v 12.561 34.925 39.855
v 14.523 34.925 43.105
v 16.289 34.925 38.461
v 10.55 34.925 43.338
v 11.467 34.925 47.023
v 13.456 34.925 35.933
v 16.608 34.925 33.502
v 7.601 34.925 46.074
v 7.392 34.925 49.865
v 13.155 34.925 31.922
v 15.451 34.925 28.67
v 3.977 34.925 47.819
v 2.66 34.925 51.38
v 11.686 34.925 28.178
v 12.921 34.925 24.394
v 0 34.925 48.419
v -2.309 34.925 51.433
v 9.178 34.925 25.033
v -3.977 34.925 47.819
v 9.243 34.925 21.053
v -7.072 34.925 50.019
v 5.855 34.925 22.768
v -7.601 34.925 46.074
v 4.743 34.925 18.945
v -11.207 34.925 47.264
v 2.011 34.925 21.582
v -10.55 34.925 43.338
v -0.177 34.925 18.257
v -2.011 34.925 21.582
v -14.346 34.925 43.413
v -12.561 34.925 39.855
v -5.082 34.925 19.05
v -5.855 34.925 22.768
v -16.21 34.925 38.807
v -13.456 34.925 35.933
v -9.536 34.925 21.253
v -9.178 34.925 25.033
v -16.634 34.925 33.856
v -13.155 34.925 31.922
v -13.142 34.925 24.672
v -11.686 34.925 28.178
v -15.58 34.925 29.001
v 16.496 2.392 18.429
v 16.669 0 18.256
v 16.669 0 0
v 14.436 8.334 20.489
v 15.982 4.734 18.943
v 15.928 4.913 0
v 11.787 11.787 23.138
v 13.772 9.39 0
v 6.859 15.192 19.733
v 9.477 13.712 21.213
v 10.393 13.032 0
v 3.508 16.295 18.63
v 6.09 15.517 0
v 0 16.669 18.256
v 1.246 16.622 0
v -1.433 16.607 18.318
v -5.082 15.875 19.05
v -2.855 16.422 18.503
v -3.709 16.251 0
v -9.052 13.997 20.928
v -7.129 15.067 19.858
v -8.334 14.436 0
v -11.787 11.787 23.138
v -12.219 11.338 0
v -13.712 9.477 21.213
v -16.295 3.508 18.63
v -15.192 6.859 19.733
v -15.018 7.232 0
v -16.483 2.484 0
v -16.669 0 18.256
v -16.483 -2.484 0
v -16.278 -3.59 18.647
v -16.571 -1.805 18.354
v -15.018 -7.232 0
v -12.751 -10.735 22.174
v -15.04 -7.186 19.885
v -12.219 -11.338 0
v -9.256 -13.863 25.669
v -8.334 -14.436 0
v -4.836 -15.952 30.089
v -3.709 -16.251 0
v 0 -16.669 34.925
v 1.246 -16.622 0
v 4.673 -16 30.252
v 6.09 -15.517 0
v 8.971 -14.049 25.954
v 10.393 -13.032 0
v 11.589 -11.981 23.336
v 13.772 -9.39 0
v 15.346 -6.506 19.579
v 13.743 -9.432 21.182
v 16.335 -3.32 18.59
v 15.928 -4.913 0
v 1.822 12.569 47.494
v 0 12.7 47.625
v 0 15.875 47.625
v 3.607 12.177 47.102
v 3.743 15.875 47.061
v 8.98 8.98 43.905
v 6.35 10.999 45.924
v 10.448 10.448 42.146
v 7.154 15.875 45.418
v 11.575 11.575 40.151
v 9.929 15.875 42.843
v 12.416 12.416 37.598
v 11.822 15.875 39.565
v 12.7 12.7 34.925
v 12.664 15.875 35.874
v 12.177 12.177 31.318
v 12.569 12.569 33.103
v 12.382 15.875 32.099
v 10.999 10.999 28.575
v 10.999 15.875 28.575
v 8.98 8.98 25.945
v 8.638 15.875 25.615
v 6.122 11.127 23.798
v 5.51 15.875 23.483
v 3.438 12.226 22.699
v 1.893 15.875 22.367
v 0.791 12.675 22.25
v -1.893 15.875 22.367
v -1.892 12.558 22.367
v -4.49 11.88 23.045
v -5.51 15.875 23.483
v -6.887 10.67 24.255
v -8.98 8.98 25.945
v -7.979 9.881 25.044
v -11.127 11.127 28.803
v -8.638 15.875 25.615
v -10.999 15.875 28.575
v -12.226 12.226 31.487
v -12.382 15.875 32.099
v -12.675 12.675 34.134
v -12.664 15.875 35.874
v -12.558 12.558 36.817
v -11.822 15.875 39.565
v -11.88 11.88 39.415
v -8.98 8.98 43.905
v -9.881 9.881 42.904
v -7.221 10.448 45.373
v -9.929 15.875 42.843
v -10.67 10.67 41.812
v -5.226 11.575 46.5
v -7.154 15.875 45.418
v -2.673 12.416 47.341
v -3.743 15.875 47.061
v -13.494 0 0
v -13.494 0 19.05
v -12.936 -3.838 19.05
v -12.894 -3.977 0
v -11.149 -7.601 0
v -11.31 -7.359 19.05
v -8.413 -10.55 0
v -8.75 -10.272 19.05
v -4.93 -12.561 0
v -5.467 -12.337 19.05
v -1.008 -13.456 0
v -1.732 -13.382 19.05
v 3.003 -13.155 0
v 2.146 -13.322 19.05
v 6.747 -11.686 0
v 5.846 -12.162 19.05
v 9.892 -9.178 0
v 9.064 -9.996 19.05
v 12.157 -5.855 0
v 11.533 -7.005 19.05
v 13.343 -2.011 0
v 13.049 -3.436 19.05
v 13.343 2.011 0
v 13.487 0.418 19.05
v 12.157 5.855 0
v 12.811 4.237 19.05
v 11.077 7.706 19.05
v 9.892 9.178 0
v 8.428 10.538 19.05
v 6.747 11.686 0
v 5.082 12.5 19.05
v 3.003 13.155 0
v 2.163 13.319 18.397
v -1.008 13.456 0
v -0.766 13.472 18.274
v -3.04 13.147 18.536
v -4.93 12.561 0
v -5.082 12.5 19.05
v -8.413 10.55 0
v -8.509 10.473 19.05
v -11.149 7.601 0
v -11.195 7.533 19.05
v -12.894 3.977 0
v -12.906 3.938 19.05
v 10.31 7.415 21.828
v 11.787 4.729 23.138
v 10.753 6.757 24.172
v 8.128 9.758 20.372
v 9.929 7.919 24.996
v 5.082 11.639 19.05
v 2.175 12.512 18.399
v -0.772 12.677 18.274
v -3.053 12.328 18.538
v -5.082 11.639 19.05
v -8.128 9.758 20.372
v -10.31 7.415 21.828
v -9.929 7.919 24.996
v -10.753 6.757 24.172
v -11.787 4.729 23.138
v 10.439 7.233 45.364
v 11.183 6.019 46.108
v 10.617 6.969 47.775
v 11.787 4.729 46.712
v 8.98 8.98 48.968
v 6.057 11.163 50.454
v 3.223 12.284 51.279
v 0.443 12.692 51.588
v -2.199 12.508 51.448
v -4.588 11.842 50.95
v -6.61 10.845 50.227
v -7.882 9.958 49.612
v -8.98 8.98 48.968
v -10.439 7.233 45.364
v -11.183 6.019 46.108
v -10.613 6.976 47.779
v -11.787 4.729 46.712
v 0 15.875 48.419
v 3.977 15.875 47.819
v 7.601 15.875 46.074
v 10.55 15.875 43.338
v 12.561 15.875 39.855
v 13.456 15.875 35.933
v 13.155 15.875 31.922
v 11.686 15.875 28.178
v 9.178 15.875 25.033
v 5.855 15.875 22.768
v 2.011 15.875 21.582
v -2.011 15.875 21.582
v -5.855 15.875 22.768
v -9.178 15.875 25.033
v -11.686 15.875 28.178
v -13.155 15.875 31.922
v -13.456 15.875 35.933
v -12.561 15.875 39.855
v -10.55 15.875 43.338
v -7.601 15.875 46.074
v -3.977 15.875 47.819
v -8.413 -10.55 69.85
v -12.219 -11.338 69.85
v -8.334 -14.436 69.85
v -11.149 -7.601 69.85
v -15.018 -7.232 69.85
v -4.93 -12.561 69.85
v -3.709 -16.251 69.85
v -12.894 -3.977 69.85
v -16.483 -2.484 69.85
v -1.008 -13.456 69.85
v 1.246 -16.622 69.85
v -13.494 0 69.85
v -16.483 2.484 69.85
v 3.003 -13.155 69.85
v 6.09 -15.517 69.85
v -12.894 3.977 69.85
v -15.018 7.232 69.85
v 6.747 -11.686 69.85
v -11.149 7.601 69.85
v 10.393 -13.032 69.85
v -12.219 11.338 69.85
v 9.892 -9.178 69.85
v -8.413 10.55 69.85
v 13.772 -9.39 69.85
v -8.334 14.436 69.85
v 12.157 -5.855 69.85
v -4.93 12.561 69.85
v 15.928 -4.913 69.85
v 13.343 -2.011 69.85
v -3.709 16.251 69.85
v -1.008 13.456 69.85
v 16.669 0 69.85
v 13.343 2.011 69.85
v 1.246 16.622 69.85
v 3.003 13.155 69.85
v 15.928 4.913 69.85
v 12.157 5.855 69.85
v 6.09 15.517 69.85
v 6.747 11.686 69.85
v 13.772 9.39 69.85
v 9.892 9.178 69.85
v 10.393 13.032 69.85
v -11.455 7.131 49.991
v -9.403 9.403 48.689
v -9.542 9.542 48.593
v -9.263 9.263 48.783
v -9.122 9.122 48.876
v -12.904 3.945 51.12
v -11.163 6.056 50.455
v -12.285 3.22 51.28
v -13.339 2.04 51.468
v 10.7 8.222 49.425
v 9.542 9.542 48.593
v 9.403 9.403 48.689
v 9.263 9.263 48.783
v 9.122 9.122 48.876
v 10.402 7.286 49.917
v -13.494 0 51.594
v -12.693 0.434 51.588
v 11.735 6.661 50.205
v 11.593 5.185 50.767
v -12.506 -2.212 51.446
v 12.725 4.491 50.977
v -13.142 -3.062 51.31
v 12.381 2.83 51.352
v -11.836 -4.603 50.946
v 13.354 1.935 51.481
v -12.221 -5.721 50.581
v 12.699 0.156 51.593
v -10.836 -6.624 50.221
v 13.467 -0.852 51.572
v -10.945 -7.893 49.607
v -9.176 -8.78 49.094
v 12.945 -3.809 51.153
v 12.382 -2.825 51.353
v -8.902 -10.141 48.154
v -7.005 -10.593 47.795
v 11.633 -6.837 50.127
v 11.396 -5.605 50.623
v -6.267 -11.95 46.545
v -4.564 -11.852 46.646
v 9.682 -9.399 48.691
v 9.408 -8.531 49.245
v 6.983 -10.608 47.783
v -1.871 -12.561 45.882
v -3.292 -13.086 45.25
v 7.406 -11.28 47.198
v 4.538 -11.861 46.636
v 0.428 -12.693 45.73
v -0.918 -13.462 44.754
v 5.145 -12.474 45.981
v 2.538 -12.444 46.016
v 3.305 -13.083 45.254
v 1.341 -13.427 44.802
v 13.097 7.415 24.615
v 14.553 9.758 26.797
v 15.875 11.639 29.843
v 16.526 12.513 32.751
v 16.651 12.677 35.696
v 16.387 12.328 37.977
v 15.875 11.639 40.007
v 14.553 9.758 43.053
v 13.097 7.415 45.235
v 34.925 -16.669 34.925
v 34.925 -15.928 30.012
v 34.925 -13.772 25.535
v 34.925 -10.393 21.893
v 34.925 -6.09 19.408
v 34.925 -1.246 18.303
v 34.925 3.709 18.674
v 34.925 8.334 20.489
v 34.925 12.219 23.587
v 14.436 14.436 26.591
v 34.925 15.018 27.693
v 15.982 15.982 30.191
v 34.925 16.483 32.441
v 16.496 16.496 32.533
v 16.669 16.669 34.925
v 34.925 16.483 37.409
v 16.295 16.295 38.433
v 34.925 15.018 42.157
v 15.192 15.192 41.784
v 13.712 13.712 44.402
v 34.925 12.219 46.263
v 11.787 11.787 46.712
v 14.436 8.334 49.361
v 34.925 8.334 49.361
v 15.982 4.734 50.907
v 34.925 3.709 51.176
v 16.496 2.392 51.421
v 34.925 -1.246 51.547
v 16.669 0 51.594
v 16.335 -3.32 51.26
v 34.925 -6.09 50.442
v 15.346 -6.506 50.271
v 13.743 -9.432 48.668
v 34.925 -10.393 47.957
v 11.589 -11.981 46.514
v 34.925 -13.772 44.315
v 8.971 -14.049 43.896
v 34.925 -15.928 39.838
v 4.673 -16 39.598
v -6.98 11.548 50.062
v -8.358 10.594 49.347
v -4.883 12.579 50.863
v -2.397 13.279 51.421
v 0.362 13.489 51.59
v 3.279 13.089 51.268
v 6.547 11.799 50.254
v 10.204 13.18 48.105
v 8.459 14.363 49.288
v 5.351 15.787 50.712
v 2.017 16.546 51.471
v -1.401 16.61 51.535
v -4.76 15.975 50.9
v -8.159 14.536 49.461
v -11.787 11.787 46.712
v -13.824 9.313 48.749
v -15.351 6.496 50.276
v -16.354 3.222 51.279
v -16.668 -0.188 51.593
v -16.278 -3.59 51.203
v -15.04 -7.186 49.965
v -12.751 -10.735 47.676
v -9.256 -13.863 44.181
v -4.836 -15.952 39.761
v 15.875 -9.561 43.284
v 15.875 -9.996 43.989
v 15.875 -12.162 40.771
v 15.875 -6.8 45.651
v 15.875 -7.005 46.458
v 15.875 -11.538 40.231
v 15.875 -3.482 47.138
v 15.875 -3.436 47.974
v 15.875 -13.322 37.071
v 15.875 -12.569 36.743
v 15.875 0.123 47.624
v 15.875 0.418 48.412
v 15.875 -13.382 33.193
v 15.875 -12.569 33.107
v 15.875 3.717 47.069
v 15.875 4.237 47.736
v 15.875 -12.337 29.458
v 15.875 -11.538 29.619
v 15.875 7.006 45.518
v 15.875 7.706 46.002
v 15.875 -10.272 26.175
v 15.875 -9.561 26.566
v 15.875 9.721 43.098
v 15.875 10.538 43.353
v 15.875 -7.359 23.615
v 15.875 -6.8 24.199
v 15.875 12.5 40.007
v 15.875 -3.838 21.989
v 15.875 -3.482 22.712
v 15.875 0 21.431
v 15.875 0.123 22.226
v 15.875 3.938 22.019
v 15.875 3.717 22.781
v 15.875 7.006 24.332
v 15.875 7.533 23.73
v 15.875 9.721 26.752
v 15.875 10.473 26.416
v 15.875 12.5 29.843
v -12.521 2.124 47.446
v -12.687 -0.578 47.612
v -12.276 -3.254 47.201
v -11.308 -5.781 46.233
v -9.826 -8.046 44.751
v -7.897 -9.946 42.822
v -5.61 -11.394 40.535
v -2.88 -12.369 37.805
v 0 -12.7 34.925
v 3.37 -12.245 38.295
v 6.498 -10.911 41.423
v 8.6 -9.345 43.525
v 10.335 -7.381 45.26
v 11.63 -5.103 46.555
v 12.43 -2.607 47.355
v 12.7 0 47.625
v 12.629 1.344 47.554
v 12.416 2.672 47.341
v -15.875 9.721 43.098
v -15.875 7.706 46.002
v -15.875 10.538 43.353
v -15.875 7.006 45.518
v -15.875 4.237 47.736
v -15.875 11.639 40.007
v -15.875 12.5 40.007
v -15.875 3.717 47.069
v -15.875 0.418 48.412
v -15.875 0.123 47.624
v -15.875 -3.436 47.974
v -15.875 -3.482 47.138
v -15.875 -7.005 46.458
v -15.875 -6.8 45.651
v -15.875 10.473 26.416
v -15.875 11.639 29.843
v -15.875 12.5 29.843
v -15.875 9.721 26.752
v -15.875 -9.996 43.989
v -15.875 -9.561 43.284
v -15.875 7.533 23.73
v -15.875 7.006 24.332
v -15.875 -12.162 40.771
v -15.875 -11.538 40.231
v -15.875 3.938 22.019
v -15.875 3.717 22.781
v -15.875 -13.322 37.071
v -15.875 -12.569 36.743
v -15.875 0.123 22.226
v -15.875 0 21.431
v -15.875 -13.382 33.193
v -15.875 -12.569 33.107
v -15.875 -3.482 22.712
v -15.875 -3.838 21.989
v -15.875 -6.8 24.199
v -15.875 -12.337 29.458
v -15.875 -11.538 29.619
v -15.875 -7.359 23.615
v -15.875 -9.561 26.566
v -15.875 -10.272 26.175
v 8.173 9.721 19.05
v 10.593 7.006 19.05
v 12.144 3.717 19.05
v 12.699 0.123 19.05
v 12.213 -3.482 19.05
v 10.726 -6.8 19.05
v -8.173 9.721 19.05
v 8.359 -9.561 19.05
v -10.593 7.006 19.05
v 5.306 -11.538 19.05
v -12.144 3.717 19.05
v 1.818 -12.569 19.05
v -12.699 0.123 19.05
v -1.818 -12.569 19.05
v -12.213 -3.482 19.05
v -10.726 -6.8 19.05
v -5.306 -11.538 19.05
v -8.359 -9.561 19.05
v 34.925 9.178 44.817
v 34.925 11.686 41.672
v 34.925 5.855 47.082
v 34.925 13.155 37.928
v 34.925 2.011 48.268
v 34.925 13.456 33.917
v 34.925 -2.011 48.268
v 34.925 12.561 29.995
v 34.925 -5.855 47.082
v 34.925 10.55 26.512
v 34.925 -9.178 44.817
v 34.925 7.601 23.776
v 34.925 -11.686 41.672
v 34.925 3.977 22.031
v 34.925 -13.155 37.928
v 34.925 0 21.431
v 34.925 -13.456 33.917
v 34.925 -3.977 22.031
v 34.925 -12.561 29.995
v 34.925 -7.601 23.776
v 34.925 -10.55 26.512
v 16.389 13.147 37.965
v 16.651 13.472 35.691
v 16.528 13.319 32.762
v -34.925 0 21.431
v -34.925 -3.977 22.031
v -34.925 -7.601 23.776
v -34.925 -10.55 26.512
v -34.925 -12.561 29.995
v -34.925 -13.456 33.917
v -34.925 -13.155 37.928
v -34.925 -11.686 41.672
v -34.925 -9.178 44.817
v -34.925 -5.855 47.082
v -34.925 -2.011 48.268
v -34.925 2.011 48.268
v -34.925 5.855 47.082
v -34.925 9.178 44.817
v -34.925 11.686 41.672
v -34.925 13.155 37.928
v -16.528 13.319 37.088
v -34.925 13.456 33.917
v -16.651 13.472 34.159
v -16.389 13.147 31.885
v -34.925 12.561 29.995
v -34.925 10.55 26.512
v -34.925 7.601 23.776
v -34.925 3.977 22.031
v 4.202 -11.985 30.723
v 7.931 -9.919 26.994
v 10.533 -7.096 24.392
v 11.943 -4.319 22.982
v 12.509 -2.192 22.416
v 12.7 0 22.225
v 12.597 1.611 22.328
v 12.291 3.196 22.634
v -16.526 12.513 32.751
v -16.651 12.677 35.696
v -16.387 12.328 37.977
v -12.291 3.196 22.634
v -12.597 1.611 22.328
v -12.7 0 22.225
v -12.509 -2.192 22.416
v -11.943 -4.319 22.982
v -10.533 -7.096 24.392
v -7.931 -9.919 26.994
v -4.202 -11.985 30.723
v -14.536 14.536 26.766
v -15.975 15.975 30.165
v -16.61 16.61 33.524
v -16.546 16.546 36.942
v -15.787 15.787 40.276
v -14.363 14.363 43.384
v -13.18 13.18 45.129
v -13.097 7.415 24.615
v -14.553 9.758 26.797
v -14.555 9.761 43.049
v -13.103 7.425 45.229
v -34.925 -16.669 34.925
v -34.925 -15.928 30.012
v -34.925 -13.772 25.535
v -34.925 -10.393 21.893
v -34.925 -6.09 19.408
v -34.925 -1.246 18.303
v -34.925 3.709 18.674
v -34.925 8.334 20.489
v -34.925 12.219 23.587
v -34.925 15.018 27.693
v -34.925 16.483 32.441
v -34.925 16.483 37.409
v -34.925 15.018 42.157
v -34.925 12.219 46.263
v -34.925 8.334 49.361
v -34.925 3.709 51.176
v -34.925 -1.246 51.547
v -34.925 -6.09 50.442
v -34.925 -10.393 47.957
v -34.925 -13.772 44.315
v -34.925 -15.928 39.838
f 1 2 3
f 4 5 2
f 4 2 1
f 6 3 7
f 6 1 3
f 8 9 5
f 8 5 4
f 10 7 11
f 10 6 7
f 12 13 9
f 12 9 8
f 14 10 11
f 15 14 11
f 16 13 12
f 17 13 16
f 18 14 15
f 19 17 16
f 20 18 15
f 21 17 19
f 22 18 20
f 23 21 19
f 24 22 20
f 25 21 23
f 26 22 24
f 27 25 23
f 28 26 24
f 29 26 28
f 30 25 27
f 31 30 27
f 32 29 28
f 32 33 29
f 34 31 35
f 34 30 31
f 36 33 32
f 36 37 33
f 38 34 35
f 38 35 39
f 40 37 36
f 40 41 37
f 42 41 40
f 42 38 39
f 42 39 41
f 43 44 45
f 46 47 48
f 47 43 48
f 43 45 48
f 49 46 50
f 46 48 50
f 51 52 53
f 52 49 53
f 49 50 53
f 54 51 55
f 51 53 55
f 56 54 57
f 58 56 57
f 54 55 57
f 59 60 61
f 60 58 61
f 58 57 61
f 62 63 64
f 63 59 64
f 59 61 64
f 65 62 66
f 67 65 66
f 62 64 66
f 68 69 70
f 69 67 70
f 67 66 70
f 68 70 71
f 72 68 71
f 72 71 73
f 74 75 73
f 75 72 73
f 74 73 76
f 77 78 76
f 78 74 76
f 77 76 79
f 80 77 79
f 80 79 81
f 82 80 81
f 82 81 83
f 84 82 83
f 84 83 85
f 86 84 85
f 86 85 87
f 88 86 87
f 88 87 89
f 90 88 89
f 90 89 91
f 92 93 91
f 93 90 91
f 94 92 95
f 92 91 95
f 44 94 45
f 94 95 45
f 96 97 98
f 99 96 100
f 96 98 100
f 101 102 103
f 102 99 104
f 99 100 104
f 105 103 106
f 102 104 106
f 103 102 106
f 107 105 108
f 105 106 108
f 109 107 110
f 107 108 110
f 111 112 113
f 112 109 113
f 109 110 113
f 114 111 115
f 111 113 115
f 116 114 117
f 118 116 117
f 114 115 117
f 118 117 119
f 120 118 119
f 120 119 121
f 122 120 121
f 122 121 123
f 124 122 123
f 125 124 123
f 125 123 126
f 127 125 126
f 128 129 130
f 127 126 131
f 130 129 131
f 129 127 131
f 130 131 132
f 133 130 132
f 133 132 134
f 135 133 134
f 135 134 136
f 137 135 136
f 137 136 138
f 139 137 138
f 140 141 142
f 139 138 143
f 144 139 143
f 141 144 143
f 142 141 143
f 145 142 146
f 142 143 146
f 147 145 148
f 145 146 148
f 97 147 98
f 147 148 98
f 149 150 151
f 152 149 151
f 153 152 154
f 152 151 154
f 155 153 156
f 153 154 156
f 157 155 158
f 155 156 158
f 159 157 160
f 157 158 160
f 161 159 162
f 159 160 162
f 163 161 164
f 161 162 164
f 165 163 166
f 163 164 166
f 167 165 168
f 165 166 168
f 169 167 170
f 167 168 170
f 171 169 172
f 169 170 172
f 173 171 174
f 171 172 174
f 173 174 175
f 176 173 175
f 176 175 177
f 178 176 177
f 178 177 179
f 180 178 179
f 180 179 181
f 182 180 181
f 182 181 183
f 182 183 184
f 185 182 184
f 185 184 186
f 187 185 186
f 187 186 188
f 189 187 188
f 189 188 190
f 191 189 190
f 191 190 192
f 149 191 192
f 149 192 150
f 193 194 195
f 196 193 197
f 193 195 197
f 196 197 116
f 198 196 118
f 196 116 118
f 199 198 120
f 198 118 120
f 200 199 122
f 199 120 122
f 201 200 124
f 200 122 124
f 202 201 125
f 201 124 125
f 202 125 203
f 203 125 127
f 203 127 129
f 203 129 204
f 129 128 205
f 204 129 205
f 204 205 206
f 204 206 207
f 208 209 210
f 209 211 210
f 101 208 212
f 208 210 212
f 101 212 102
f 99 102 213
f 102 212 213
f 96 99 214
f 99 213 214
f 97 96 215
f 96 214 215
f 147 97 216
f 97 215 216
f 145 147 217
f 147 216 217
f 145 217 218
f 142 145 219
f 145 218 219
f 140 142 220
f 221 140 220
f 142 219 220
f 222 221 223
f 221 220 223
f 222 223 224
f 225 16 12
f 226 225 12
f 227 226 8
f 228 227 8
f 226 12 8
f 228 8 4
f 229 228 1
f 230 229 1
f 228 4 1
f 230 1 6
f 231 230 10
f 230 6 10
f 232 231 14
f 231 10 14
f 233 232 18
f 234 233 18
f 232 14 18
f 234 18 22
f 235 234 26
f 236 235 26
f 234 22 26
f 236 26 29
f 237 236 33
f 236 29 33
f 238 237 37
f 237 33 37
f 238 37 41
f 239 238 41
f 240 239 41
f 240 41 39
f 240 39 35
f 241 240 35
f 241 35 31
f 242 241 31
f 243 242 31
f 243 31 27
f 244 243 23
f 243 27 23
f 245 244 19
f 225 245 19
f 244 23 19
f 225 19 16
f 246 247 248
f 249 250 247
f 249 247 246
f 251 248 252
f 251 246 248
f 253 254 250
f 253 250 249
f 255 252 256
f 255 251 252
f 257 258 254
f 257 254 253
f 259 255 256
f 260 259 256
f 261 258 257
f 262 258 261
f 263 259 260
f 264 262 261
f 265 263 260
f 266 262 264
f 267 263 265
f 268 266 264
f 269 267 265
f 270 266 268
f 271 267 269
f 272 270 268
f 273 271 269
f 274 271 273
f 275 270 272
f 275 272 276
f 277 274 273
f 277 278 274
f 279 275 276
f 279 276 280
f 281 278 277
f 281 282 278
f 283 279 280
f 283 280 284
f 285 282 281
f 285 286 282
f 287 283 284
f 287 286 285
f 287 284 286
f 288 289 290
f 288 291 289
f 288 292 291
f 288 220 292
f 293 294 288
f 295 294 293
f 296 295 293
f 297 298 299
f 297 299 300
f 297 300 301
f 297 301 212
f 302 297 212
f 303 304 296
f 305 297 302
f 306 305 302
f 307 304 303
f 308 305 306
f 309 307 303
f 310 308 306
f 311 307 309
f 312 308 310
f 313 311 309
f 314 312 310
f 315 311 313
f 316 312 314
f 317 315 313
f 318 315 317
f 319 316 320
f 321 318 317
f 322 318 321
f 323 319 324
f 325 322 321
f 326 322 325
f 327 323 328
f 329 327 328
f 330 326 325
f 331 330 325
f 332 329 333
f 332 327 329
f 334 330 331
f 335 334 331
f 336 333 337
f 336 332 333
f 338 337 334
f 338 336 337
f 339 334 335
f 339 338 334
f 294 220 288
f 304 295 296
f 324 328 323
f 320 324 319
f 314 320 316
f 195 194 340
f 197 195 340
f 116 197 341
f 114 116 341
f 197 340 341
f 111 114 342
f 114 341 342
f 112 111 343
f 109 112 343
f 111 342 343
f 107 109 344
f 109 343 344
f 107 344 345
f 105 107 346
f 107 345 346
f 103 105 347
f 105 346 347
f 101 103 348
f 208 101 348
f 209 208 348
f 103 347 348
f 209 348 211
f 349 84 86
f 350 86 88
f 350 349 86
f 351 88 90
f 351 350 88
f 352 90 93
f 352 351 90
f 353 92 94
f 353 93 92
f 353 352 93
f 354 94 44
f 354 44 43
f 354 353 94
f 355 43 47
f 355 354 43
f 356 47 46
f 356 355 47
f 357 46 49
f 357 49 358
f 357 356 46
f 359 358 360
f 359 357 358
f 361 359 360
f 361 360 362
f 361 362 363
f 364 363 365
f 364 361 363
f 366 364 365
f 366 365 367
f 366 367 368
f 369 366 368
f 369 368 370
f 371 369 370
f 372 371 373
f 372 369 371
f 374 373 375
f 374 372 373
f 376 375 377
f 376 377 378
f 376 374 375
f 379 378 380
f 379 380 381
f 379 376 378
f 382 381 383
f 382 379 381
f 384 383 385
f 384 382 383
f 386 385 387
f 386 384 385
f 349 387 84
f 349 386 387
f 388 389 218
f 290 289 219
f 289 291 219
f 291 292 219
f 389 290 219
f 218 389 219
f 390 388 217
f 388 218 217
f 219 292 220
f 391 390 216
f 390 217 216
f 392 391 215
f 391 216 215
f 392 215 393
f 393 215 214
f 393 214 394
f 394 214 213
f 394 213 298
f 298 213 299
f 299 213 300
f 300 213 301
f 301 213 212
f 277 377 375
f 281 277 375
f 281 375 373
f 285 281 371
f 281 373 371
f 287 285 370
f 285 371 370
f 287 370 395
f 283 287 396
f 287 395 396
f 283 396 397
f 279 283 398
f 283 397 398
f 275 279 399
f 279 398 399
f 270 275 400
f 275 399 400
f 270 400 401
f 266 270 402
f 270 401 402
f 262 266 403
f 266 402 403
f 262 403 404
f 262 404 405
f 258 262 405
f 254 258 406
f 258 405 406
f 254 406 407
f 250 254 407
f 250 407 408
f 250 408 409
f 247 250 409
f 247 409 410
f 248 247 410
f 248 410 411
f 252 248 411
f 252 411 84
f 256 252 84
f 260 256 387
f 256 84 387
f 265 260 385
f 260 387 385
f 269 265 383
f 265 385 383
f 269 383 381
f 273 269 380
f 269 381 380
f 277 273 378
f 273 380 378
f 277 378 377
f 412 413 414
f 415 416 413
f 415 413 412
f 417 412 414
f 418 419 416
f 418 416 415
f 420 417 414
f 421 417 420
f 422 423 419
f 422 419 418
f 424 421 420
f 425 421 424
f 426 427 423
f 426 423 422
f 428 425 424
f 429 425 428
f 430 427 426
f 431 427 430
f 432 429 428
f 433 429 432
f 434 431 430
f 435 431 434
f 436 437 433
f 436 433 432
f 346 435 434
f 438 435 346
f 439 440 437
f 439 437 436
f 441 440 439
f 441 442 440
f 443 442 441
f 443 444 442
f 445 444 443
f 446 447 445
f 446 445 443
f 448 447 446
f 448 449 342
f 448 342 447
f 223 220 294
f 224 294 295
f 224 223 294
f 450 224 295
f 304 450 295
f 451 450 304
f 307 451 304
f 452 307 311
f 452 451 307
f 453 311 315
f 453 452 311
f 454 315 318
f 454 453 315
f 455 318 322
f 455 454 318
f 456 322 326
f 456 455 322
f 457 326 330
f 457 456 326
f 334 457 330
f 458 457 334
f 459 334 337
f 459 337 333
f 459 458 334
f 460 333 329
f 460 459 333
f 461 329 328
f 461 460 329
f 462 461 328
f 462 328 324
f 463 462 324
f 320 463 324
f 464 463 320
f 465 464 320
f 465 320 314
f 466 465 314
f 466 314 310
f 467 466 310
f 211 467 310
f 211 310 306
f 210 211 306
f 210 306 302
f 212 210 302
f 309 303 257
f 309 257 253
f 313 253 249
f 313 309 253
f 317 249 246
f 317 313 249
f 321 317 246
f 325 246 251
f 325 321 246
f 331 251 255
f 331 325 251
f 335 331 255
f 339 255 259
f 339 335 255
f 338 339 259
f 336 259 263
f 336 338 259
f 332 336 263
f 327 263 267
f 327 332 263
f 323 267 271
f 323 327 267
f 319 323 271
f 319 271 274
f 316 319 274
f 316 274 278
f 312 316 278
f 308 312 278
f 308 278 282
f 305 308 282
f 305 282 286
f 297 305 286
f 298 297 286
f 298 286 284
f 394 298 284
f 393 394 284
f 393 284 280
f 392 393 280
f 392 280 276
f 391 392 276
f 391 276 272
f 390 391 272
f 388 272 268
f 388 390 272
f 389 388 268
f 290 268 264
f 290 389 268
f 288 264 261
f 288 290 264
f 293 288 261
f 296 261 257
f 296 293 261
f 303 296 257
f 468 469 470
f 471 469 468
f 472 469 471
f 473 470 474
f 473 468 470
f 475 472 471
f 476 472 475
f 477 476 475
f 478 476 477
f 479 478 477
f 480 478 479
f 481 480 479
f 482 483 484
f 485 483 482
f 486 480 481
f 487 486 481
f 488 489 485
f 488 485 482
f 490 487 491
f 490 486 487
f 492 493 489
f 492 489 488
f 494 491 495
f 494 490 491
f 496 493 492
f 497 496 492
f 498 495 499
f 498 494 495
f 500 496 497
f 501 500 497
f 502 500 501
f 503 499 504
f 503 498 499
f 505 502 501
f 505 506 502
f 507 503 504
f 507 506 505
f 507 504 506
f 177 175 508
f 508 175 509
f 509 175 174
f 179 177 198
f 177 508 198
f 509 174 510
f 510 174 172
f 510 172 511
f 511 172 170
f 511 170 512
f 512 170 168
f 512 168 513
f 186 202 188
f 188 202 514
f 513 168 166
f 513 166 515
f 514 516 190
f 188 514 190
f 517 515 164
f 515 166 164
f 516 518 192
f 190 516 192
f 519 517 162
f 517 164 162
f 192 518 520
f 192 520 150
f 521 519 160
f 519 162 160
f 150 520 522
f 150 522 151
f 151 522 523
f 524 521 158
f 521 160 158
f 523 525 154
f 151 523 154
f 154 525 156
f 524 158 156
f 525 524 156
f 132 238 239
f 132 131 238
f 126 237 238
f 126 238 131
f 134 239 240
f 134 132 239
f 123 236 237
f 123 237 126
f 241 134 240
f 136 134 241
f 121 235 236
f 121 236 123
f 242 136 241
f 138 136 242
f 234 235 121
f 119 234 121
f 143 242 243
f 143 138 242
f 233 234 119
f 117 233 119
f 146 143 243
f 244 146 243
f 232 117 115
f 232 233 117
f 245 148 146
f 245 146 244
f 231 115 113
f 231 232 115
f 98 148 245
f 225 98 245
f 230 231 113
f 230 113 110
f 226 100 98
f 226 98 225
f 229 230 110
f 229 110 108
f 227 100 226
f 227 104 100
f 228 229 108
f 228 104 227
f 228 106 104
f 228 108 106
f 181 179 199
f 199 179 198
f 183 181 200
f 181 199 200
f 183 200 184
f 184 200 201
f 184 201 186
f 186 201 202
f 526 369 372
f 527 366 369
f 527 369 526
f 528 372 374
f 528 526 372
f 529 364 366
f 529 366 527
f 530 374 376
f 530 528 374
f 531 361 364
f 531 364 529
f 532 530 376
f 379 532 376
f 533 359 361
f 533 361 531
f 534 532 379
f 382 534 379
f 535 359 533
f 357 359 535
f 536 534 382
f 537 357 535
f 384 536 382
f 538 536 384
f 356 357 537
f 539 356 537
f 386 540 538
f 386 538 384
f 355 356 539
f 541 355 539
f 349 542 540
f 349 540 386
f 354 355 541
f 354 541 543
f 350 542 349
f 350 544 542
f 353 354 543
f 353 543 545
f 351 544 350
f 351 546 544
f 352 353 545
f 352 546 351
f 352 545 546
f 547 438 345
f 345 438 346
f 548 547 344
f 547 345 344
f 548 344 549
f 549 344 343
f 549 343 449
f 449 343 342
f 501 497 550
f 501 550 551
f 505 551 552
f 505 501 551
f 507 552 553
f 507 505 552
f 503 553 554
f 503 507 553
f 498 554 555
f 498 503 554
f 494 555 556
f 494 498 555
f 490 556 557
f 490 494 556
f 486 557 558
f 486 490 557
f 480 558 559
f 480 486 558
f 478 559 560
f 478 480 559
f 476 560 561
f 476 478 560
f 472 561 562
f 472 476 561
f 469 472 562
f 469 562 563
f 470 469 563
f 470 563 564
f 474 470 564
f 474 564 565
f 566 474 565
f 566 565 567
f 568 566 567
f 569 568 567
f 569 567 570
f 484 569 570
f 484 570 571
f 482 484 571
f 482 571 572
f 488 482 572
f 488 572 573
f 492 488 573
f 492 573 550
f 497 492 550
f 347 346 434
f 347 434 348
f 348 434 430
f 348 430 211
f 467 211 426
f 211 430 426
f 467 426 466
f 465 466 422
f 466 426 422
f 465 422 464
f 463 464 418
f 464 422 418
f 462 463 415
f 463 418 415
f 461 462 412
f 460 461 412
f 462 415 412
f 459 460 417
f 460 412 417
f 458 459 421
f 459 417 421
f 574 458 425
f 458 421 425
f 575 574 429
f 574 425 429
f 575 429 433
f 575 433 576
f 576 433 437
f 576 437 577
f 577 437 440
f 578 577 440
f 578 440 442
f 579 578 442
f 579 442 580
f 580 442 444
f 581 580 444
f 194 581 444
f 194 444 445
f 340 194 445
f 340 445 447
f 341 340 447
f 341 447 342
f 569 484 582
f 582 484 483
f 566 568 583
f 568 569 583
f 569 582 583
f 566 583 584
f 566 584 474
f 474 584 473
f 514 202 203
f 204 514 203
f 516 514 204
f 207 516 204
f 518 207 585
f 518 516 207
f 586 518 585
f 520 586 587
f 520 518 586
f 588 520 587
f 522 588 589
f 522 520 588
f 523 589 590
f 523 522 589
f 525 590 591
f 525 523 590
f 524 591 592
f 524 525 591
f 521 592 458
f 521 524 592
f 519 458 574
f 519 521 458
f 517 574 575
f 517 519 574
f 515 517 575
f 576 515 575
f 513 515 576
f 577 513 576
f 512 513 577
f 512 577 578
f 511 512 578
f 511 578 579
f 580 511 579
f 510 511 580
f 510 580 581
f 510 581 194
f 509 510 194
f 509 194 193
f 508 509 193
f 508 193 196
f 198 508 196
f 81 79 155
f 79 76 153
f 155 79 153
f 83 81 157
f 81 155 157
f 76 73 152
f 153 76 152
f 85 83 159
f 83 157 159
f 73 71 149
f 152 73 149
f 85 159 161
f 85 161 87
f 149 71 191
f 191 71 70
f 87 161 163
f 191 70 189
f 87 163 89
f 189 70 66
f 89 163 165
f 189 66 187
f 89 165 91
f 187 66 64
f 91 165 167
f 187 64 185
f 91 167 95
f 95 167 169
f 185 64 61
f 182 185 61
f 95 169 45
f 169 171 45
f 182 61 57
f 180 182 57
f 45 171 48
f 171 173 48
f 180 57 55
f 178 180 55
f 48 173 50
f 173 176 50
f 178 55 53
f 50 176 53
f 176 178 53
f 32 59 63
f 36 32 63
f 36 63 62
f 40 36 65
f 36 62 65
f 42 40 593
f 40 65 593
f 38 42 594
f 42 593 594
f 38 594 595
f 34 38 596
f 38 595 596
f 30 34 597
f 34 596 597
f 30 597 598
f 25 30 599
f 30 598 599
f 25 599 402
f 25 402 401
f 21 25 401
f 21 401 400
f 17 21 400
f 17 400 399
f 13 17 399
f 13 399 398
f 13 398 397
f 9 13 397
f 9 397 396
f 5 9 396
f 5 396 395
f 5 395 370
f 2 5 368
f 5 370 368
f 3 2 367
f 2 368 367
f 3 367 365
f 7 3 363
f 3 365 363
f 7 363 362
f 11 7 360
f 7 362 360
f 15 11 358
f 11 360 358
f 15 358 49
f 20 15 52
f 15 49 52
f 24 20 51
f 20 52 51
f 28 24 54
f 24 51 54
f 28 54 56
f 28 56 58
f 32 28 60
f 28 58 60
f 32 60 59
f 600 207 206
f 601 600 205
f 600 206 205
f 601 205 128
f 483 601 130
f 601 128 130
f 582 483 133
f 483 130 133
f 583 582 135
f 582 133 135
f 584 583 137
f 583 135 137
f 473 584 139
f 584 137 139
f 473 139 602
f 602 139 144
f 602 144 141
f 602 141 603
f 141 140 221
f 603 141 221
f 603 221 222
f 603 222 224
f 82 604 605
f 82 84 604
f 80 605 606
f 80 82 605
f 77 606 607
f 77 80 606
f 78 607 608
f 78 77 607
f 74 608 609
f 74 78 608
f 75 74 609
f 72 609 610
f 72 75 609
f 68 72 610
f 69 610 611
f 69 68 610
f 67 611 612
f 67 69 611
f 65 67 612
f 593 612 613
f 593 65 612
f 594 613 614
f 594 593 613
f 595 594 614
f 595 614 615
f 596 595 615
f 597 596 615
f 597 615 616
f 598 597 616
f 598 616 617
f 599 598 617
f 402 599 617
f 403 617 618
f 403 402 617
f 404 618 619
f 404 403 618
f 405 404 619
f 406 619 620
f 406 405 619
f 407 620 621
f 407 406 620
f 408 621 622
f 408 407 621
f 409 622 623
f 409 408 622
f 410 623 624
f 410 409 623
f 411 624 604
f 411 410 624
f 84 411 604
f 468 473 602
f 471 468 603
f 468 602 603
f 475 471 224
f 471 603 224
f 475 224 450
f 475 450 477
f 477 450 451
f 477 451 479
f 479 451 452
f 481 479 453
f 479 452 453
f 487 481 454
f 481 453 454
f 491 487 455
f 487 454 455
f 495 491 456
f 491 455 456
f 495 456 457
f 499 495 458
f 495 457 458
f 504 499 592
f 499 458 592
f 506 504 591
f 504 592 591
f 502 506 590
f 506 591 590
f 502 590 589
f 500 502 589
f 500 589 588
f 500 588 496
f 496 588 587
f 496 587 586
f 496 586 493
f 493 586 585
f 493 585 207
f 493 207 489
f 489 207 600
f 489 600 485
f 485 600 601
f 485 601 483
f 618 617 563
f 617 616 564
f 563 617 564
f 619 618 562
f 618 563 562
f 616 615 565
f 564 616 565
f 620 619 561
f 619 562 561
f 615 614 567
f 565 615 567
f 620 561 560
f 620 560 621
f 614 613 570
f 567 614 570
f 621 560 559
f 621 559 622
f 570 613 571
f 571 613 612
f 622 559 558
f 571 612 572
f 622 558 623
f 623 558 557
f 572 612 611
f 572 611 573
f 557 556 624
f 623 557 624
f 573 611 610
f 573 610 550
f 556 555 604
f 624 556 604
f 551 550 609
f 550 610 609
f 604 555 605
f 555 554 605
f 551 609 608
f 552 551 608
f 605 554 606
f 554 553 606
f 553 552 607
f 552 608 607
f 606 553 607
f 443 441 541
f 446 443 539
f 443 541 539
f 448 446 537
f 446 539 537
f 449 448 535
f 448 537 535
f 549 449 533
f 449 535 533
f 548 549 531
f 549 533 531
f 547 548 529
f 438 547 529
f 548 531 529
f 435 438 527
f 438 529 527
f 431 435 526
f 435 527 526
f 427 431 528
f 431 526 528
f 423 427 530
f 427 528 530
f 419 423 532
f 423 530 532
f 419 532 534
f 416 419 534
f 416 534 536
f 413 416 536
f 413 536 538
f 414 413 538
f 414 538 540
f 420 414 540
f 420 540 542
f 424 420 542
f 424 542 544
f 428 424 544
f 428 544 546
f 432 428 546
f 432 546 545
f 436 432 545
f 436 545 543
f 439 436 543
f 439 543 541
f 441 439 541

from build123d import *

# Parameters (mm, degrees)
SKETCH1_R               = 16.66875
BOSS_EXTRUDE1_DEPTH     = 69.85
CUT_EXTRUDE1_DEPTH      = 74.720532778
CUT_EXTRUDE1_DEPTH_BACK = 26.9875
SKETCH3_R               = 13.49375
SKETCH4_R               = 16.66875
BOSS_EXTRUDE2_DEPTH     = 34.925
SKETCH5_R               = 12.7
CUT_EXTRUDE2_DEPTH      = 101.179300459
CUT_EXTRUDE8_START      = 19.05
SKETCH11_R              = 13.49375
CUT_EXTRUDE8_DEPTH      = 19.05
CUT_EXTRUDE5_DEPTH      = 80.853774811
CUT_EXTRUDE5_DEPTH_BACK = 80.853774811
SKETCH10_R              = 12.7
SKETCH13_R              = 13.49375
CUT_EXTRUDE9_DEPTH      = 19.05
CUT_EXTRUDE10_START     = -19.05
SKETCH14_R              = 13.49375
CUT_EXTRUDE10_DEPTH     = 19.05
SKETCH15_R              = 16.66875
BOSS_EXTRUDE3_DEPTH     = 34.925
SKETCH17_R              = 13.49375
CUT_EXTRUDE12_DEPTH     = 19.05
SKETCH19_R              = 12.7
CUT_EXTRUDE14_DEPTH     = 105.775000133
SKETCH20_R              = 12.7
CUT_EXTRUDE15_DEPTH     = 86.548429389
SKETCH22_R              = 12.7
CUT_EXTRUDE16_DEPTH     = 30.48


with BuildPart() as part:
    # Sketch1 → Boss-Extrude1 (new body)
    with BuildSketch(Plane.XY):
        Circle(SKETCH1_R)
    extrude(amount=BOSS_EXTRUDE1_DEPTH)

    # Sketch3 → Cut-Extrude1 (cut, two sides: drawn at the far end of the back side and taken through both)
    with BuildSketch(Plane.XY.offset(69.85).offset(-CUT_EXTRUDE1_DEPTH_BACK)):
        with Locations(Location((0, 0, 0), (0, 0, 180))):
            Circle(SKETCH3_R)
    extrude(amount=CUT_EXTRUDE1_DEPTH + CUT_EXTRUDE1_DEPTH_BACK, mode=Mode.SUBTRACT)

    # Sketch4 → Boss-Extrude2 (add, symmetric)
    with BuildSketch(Plane(origin=(0, 0, 0), x_dir=(0, 0, -1), z_dir=(1, 0, 0))):
        with Locations(Location((-34.925, 0, 0), (0, 0, 270))):
            Circle(SKETCH4_R)
    extrude(amount=BOSS_EXTRUDE2_DEPTH, both=True)

    # Sketch5 → Cut-Extrude2 (cut, through all)
    with BuildSketch(Plane(origin=(34.925, 0, 0), x_dir=(0, 0, -1), z_dir=(1, 0, 0))):
        with Locations((-34.925, 0)):
            Circle(SKETCH5_R)
    extrude(amount=-CUT_EXTRUDE2_DEPTH, mode=Mode.SUBTRACT)

    # Sketch11 → Cut-Extrude8 (cut)
    with BuildSketch(Plane.XY.offset(CUT_EXTRUDE8_START)):
        with Locations(Location((0, 0, 0), (0, 0, 180))):
            Circle(SKETCH11_R)
    extrude(amount=-CUT_EXTRUDE8_DEPTH, mode=Mode.SUBTRACT)

    # Sketch10 → Cut-Extrude5 (cut, two sides: drawn at the far end of the back side and taken through both)
    with BuildSketch(Plane.XY.offset(69.85).offset(-CUT_EXTRUDE5_DEPTH_BACK)):
        Circle(SKETCH10_R)
    extrude(amount=CUT_EXTRUDE5_DEPTH + CUT_EXTRUDE5_DEPTH_BACK, mode=Mode.SUBTRACT)

    # Sketch13 → Cut-Extrude9 (cut)
    with BuildSketch(Plane(origin=(34.925, 0, 0), x_dir=(0, 0, -1), z_dir=(1, 0, 0))):
        with Locations((-34.925, 0)):
            Circle(SKETCH13_R)
    extrude(amount=-CUT_EXTRUDE9_DEPTH, mode=Mode.SUBTRACT)

    # Sketch14 → Cut-Extrude10 (cut)
    with BuildSketch(Plane.ZY.offset(34.925).offset(CUT_EXTRUDE10_START)):
        with Locations(Location((34.925, 0, 0), (0, 0, 180))):
            Circle(SKETCH14_R)
    extrude(amount=CUT_EXTRUDE10_DEPTH, mode=Mode.SUBTRACT)

    # Sketch15 → Boss-Extrude3 (add)
    with BuildSketch(Plane(origin=(0, 0, 0), x_dir=(1, 0, 0), z_dir=(0, 1, 0))):
        with Locations(Location((0, -34.925, 0), (0, 0, 107.752790162))):
            Circle(SKETCH15_R)
    extrude(amount=BOSS_EXTRUDE3_DEPTH)

    # Sketch17 → Cut-Extrude12 (cut)
    with BuildSketch(Plane(origin=(0, 34.925, 0), x_dir=(1, 0, 0), z_dir=(0, 1, 0))):
        with Locations(Location((0, -34.925, 0), (0, 0, 270))):
            Circle(SKETCH17_R)
    extrude(amount=-CUT_EXTRUDE12_DEPTH, mode=Mode.SUBTRACT)

    # Sketch19 → Cut-Extrude14 (cut, through all)
    with BuildSketch(Plane(origin=(34.925, 0, 0), x_dir=(0, 0, -1), z_dir=(1, 0, 0))):
        with Locations(Location((-34.925, 0, 0), (0, 0, 66.409614008))):
            Circle(SKETCH19_R)
    extrude(amount=-CUT_EXTRUDE14_DEPTH, mode=Mode.SUBTRACT)

    # Sketch20 → Cut-Extrude15 (cut, through all)
    with BuildSketch(Plane.XY.offset(69.85)):
        with Locations(Location((0, 0, 0), (0, 0, 113.590385992))):
            Circle(SKETCH20_R)
    extrude(amount=-CUT_EXTRUDE15_DEPTH, mode=Mode.SUBTRACT)

    # Sketch22 → Cut-Extrude16 (cut)
    with BuildSketch(Plane(origin=(0, 34.925, 0), x_dir=(1, 0, 0), z_dir=(0, 1, 0))):
        with Locations(Location((0, -34.925, 0), (0, 0, 270))):
            Circle(SKETCH22_R)
    extrude(amount=-CUT_EXTRUDE16_DEPTH, mode=Mode.SUBTRACT)


solid = part.part
